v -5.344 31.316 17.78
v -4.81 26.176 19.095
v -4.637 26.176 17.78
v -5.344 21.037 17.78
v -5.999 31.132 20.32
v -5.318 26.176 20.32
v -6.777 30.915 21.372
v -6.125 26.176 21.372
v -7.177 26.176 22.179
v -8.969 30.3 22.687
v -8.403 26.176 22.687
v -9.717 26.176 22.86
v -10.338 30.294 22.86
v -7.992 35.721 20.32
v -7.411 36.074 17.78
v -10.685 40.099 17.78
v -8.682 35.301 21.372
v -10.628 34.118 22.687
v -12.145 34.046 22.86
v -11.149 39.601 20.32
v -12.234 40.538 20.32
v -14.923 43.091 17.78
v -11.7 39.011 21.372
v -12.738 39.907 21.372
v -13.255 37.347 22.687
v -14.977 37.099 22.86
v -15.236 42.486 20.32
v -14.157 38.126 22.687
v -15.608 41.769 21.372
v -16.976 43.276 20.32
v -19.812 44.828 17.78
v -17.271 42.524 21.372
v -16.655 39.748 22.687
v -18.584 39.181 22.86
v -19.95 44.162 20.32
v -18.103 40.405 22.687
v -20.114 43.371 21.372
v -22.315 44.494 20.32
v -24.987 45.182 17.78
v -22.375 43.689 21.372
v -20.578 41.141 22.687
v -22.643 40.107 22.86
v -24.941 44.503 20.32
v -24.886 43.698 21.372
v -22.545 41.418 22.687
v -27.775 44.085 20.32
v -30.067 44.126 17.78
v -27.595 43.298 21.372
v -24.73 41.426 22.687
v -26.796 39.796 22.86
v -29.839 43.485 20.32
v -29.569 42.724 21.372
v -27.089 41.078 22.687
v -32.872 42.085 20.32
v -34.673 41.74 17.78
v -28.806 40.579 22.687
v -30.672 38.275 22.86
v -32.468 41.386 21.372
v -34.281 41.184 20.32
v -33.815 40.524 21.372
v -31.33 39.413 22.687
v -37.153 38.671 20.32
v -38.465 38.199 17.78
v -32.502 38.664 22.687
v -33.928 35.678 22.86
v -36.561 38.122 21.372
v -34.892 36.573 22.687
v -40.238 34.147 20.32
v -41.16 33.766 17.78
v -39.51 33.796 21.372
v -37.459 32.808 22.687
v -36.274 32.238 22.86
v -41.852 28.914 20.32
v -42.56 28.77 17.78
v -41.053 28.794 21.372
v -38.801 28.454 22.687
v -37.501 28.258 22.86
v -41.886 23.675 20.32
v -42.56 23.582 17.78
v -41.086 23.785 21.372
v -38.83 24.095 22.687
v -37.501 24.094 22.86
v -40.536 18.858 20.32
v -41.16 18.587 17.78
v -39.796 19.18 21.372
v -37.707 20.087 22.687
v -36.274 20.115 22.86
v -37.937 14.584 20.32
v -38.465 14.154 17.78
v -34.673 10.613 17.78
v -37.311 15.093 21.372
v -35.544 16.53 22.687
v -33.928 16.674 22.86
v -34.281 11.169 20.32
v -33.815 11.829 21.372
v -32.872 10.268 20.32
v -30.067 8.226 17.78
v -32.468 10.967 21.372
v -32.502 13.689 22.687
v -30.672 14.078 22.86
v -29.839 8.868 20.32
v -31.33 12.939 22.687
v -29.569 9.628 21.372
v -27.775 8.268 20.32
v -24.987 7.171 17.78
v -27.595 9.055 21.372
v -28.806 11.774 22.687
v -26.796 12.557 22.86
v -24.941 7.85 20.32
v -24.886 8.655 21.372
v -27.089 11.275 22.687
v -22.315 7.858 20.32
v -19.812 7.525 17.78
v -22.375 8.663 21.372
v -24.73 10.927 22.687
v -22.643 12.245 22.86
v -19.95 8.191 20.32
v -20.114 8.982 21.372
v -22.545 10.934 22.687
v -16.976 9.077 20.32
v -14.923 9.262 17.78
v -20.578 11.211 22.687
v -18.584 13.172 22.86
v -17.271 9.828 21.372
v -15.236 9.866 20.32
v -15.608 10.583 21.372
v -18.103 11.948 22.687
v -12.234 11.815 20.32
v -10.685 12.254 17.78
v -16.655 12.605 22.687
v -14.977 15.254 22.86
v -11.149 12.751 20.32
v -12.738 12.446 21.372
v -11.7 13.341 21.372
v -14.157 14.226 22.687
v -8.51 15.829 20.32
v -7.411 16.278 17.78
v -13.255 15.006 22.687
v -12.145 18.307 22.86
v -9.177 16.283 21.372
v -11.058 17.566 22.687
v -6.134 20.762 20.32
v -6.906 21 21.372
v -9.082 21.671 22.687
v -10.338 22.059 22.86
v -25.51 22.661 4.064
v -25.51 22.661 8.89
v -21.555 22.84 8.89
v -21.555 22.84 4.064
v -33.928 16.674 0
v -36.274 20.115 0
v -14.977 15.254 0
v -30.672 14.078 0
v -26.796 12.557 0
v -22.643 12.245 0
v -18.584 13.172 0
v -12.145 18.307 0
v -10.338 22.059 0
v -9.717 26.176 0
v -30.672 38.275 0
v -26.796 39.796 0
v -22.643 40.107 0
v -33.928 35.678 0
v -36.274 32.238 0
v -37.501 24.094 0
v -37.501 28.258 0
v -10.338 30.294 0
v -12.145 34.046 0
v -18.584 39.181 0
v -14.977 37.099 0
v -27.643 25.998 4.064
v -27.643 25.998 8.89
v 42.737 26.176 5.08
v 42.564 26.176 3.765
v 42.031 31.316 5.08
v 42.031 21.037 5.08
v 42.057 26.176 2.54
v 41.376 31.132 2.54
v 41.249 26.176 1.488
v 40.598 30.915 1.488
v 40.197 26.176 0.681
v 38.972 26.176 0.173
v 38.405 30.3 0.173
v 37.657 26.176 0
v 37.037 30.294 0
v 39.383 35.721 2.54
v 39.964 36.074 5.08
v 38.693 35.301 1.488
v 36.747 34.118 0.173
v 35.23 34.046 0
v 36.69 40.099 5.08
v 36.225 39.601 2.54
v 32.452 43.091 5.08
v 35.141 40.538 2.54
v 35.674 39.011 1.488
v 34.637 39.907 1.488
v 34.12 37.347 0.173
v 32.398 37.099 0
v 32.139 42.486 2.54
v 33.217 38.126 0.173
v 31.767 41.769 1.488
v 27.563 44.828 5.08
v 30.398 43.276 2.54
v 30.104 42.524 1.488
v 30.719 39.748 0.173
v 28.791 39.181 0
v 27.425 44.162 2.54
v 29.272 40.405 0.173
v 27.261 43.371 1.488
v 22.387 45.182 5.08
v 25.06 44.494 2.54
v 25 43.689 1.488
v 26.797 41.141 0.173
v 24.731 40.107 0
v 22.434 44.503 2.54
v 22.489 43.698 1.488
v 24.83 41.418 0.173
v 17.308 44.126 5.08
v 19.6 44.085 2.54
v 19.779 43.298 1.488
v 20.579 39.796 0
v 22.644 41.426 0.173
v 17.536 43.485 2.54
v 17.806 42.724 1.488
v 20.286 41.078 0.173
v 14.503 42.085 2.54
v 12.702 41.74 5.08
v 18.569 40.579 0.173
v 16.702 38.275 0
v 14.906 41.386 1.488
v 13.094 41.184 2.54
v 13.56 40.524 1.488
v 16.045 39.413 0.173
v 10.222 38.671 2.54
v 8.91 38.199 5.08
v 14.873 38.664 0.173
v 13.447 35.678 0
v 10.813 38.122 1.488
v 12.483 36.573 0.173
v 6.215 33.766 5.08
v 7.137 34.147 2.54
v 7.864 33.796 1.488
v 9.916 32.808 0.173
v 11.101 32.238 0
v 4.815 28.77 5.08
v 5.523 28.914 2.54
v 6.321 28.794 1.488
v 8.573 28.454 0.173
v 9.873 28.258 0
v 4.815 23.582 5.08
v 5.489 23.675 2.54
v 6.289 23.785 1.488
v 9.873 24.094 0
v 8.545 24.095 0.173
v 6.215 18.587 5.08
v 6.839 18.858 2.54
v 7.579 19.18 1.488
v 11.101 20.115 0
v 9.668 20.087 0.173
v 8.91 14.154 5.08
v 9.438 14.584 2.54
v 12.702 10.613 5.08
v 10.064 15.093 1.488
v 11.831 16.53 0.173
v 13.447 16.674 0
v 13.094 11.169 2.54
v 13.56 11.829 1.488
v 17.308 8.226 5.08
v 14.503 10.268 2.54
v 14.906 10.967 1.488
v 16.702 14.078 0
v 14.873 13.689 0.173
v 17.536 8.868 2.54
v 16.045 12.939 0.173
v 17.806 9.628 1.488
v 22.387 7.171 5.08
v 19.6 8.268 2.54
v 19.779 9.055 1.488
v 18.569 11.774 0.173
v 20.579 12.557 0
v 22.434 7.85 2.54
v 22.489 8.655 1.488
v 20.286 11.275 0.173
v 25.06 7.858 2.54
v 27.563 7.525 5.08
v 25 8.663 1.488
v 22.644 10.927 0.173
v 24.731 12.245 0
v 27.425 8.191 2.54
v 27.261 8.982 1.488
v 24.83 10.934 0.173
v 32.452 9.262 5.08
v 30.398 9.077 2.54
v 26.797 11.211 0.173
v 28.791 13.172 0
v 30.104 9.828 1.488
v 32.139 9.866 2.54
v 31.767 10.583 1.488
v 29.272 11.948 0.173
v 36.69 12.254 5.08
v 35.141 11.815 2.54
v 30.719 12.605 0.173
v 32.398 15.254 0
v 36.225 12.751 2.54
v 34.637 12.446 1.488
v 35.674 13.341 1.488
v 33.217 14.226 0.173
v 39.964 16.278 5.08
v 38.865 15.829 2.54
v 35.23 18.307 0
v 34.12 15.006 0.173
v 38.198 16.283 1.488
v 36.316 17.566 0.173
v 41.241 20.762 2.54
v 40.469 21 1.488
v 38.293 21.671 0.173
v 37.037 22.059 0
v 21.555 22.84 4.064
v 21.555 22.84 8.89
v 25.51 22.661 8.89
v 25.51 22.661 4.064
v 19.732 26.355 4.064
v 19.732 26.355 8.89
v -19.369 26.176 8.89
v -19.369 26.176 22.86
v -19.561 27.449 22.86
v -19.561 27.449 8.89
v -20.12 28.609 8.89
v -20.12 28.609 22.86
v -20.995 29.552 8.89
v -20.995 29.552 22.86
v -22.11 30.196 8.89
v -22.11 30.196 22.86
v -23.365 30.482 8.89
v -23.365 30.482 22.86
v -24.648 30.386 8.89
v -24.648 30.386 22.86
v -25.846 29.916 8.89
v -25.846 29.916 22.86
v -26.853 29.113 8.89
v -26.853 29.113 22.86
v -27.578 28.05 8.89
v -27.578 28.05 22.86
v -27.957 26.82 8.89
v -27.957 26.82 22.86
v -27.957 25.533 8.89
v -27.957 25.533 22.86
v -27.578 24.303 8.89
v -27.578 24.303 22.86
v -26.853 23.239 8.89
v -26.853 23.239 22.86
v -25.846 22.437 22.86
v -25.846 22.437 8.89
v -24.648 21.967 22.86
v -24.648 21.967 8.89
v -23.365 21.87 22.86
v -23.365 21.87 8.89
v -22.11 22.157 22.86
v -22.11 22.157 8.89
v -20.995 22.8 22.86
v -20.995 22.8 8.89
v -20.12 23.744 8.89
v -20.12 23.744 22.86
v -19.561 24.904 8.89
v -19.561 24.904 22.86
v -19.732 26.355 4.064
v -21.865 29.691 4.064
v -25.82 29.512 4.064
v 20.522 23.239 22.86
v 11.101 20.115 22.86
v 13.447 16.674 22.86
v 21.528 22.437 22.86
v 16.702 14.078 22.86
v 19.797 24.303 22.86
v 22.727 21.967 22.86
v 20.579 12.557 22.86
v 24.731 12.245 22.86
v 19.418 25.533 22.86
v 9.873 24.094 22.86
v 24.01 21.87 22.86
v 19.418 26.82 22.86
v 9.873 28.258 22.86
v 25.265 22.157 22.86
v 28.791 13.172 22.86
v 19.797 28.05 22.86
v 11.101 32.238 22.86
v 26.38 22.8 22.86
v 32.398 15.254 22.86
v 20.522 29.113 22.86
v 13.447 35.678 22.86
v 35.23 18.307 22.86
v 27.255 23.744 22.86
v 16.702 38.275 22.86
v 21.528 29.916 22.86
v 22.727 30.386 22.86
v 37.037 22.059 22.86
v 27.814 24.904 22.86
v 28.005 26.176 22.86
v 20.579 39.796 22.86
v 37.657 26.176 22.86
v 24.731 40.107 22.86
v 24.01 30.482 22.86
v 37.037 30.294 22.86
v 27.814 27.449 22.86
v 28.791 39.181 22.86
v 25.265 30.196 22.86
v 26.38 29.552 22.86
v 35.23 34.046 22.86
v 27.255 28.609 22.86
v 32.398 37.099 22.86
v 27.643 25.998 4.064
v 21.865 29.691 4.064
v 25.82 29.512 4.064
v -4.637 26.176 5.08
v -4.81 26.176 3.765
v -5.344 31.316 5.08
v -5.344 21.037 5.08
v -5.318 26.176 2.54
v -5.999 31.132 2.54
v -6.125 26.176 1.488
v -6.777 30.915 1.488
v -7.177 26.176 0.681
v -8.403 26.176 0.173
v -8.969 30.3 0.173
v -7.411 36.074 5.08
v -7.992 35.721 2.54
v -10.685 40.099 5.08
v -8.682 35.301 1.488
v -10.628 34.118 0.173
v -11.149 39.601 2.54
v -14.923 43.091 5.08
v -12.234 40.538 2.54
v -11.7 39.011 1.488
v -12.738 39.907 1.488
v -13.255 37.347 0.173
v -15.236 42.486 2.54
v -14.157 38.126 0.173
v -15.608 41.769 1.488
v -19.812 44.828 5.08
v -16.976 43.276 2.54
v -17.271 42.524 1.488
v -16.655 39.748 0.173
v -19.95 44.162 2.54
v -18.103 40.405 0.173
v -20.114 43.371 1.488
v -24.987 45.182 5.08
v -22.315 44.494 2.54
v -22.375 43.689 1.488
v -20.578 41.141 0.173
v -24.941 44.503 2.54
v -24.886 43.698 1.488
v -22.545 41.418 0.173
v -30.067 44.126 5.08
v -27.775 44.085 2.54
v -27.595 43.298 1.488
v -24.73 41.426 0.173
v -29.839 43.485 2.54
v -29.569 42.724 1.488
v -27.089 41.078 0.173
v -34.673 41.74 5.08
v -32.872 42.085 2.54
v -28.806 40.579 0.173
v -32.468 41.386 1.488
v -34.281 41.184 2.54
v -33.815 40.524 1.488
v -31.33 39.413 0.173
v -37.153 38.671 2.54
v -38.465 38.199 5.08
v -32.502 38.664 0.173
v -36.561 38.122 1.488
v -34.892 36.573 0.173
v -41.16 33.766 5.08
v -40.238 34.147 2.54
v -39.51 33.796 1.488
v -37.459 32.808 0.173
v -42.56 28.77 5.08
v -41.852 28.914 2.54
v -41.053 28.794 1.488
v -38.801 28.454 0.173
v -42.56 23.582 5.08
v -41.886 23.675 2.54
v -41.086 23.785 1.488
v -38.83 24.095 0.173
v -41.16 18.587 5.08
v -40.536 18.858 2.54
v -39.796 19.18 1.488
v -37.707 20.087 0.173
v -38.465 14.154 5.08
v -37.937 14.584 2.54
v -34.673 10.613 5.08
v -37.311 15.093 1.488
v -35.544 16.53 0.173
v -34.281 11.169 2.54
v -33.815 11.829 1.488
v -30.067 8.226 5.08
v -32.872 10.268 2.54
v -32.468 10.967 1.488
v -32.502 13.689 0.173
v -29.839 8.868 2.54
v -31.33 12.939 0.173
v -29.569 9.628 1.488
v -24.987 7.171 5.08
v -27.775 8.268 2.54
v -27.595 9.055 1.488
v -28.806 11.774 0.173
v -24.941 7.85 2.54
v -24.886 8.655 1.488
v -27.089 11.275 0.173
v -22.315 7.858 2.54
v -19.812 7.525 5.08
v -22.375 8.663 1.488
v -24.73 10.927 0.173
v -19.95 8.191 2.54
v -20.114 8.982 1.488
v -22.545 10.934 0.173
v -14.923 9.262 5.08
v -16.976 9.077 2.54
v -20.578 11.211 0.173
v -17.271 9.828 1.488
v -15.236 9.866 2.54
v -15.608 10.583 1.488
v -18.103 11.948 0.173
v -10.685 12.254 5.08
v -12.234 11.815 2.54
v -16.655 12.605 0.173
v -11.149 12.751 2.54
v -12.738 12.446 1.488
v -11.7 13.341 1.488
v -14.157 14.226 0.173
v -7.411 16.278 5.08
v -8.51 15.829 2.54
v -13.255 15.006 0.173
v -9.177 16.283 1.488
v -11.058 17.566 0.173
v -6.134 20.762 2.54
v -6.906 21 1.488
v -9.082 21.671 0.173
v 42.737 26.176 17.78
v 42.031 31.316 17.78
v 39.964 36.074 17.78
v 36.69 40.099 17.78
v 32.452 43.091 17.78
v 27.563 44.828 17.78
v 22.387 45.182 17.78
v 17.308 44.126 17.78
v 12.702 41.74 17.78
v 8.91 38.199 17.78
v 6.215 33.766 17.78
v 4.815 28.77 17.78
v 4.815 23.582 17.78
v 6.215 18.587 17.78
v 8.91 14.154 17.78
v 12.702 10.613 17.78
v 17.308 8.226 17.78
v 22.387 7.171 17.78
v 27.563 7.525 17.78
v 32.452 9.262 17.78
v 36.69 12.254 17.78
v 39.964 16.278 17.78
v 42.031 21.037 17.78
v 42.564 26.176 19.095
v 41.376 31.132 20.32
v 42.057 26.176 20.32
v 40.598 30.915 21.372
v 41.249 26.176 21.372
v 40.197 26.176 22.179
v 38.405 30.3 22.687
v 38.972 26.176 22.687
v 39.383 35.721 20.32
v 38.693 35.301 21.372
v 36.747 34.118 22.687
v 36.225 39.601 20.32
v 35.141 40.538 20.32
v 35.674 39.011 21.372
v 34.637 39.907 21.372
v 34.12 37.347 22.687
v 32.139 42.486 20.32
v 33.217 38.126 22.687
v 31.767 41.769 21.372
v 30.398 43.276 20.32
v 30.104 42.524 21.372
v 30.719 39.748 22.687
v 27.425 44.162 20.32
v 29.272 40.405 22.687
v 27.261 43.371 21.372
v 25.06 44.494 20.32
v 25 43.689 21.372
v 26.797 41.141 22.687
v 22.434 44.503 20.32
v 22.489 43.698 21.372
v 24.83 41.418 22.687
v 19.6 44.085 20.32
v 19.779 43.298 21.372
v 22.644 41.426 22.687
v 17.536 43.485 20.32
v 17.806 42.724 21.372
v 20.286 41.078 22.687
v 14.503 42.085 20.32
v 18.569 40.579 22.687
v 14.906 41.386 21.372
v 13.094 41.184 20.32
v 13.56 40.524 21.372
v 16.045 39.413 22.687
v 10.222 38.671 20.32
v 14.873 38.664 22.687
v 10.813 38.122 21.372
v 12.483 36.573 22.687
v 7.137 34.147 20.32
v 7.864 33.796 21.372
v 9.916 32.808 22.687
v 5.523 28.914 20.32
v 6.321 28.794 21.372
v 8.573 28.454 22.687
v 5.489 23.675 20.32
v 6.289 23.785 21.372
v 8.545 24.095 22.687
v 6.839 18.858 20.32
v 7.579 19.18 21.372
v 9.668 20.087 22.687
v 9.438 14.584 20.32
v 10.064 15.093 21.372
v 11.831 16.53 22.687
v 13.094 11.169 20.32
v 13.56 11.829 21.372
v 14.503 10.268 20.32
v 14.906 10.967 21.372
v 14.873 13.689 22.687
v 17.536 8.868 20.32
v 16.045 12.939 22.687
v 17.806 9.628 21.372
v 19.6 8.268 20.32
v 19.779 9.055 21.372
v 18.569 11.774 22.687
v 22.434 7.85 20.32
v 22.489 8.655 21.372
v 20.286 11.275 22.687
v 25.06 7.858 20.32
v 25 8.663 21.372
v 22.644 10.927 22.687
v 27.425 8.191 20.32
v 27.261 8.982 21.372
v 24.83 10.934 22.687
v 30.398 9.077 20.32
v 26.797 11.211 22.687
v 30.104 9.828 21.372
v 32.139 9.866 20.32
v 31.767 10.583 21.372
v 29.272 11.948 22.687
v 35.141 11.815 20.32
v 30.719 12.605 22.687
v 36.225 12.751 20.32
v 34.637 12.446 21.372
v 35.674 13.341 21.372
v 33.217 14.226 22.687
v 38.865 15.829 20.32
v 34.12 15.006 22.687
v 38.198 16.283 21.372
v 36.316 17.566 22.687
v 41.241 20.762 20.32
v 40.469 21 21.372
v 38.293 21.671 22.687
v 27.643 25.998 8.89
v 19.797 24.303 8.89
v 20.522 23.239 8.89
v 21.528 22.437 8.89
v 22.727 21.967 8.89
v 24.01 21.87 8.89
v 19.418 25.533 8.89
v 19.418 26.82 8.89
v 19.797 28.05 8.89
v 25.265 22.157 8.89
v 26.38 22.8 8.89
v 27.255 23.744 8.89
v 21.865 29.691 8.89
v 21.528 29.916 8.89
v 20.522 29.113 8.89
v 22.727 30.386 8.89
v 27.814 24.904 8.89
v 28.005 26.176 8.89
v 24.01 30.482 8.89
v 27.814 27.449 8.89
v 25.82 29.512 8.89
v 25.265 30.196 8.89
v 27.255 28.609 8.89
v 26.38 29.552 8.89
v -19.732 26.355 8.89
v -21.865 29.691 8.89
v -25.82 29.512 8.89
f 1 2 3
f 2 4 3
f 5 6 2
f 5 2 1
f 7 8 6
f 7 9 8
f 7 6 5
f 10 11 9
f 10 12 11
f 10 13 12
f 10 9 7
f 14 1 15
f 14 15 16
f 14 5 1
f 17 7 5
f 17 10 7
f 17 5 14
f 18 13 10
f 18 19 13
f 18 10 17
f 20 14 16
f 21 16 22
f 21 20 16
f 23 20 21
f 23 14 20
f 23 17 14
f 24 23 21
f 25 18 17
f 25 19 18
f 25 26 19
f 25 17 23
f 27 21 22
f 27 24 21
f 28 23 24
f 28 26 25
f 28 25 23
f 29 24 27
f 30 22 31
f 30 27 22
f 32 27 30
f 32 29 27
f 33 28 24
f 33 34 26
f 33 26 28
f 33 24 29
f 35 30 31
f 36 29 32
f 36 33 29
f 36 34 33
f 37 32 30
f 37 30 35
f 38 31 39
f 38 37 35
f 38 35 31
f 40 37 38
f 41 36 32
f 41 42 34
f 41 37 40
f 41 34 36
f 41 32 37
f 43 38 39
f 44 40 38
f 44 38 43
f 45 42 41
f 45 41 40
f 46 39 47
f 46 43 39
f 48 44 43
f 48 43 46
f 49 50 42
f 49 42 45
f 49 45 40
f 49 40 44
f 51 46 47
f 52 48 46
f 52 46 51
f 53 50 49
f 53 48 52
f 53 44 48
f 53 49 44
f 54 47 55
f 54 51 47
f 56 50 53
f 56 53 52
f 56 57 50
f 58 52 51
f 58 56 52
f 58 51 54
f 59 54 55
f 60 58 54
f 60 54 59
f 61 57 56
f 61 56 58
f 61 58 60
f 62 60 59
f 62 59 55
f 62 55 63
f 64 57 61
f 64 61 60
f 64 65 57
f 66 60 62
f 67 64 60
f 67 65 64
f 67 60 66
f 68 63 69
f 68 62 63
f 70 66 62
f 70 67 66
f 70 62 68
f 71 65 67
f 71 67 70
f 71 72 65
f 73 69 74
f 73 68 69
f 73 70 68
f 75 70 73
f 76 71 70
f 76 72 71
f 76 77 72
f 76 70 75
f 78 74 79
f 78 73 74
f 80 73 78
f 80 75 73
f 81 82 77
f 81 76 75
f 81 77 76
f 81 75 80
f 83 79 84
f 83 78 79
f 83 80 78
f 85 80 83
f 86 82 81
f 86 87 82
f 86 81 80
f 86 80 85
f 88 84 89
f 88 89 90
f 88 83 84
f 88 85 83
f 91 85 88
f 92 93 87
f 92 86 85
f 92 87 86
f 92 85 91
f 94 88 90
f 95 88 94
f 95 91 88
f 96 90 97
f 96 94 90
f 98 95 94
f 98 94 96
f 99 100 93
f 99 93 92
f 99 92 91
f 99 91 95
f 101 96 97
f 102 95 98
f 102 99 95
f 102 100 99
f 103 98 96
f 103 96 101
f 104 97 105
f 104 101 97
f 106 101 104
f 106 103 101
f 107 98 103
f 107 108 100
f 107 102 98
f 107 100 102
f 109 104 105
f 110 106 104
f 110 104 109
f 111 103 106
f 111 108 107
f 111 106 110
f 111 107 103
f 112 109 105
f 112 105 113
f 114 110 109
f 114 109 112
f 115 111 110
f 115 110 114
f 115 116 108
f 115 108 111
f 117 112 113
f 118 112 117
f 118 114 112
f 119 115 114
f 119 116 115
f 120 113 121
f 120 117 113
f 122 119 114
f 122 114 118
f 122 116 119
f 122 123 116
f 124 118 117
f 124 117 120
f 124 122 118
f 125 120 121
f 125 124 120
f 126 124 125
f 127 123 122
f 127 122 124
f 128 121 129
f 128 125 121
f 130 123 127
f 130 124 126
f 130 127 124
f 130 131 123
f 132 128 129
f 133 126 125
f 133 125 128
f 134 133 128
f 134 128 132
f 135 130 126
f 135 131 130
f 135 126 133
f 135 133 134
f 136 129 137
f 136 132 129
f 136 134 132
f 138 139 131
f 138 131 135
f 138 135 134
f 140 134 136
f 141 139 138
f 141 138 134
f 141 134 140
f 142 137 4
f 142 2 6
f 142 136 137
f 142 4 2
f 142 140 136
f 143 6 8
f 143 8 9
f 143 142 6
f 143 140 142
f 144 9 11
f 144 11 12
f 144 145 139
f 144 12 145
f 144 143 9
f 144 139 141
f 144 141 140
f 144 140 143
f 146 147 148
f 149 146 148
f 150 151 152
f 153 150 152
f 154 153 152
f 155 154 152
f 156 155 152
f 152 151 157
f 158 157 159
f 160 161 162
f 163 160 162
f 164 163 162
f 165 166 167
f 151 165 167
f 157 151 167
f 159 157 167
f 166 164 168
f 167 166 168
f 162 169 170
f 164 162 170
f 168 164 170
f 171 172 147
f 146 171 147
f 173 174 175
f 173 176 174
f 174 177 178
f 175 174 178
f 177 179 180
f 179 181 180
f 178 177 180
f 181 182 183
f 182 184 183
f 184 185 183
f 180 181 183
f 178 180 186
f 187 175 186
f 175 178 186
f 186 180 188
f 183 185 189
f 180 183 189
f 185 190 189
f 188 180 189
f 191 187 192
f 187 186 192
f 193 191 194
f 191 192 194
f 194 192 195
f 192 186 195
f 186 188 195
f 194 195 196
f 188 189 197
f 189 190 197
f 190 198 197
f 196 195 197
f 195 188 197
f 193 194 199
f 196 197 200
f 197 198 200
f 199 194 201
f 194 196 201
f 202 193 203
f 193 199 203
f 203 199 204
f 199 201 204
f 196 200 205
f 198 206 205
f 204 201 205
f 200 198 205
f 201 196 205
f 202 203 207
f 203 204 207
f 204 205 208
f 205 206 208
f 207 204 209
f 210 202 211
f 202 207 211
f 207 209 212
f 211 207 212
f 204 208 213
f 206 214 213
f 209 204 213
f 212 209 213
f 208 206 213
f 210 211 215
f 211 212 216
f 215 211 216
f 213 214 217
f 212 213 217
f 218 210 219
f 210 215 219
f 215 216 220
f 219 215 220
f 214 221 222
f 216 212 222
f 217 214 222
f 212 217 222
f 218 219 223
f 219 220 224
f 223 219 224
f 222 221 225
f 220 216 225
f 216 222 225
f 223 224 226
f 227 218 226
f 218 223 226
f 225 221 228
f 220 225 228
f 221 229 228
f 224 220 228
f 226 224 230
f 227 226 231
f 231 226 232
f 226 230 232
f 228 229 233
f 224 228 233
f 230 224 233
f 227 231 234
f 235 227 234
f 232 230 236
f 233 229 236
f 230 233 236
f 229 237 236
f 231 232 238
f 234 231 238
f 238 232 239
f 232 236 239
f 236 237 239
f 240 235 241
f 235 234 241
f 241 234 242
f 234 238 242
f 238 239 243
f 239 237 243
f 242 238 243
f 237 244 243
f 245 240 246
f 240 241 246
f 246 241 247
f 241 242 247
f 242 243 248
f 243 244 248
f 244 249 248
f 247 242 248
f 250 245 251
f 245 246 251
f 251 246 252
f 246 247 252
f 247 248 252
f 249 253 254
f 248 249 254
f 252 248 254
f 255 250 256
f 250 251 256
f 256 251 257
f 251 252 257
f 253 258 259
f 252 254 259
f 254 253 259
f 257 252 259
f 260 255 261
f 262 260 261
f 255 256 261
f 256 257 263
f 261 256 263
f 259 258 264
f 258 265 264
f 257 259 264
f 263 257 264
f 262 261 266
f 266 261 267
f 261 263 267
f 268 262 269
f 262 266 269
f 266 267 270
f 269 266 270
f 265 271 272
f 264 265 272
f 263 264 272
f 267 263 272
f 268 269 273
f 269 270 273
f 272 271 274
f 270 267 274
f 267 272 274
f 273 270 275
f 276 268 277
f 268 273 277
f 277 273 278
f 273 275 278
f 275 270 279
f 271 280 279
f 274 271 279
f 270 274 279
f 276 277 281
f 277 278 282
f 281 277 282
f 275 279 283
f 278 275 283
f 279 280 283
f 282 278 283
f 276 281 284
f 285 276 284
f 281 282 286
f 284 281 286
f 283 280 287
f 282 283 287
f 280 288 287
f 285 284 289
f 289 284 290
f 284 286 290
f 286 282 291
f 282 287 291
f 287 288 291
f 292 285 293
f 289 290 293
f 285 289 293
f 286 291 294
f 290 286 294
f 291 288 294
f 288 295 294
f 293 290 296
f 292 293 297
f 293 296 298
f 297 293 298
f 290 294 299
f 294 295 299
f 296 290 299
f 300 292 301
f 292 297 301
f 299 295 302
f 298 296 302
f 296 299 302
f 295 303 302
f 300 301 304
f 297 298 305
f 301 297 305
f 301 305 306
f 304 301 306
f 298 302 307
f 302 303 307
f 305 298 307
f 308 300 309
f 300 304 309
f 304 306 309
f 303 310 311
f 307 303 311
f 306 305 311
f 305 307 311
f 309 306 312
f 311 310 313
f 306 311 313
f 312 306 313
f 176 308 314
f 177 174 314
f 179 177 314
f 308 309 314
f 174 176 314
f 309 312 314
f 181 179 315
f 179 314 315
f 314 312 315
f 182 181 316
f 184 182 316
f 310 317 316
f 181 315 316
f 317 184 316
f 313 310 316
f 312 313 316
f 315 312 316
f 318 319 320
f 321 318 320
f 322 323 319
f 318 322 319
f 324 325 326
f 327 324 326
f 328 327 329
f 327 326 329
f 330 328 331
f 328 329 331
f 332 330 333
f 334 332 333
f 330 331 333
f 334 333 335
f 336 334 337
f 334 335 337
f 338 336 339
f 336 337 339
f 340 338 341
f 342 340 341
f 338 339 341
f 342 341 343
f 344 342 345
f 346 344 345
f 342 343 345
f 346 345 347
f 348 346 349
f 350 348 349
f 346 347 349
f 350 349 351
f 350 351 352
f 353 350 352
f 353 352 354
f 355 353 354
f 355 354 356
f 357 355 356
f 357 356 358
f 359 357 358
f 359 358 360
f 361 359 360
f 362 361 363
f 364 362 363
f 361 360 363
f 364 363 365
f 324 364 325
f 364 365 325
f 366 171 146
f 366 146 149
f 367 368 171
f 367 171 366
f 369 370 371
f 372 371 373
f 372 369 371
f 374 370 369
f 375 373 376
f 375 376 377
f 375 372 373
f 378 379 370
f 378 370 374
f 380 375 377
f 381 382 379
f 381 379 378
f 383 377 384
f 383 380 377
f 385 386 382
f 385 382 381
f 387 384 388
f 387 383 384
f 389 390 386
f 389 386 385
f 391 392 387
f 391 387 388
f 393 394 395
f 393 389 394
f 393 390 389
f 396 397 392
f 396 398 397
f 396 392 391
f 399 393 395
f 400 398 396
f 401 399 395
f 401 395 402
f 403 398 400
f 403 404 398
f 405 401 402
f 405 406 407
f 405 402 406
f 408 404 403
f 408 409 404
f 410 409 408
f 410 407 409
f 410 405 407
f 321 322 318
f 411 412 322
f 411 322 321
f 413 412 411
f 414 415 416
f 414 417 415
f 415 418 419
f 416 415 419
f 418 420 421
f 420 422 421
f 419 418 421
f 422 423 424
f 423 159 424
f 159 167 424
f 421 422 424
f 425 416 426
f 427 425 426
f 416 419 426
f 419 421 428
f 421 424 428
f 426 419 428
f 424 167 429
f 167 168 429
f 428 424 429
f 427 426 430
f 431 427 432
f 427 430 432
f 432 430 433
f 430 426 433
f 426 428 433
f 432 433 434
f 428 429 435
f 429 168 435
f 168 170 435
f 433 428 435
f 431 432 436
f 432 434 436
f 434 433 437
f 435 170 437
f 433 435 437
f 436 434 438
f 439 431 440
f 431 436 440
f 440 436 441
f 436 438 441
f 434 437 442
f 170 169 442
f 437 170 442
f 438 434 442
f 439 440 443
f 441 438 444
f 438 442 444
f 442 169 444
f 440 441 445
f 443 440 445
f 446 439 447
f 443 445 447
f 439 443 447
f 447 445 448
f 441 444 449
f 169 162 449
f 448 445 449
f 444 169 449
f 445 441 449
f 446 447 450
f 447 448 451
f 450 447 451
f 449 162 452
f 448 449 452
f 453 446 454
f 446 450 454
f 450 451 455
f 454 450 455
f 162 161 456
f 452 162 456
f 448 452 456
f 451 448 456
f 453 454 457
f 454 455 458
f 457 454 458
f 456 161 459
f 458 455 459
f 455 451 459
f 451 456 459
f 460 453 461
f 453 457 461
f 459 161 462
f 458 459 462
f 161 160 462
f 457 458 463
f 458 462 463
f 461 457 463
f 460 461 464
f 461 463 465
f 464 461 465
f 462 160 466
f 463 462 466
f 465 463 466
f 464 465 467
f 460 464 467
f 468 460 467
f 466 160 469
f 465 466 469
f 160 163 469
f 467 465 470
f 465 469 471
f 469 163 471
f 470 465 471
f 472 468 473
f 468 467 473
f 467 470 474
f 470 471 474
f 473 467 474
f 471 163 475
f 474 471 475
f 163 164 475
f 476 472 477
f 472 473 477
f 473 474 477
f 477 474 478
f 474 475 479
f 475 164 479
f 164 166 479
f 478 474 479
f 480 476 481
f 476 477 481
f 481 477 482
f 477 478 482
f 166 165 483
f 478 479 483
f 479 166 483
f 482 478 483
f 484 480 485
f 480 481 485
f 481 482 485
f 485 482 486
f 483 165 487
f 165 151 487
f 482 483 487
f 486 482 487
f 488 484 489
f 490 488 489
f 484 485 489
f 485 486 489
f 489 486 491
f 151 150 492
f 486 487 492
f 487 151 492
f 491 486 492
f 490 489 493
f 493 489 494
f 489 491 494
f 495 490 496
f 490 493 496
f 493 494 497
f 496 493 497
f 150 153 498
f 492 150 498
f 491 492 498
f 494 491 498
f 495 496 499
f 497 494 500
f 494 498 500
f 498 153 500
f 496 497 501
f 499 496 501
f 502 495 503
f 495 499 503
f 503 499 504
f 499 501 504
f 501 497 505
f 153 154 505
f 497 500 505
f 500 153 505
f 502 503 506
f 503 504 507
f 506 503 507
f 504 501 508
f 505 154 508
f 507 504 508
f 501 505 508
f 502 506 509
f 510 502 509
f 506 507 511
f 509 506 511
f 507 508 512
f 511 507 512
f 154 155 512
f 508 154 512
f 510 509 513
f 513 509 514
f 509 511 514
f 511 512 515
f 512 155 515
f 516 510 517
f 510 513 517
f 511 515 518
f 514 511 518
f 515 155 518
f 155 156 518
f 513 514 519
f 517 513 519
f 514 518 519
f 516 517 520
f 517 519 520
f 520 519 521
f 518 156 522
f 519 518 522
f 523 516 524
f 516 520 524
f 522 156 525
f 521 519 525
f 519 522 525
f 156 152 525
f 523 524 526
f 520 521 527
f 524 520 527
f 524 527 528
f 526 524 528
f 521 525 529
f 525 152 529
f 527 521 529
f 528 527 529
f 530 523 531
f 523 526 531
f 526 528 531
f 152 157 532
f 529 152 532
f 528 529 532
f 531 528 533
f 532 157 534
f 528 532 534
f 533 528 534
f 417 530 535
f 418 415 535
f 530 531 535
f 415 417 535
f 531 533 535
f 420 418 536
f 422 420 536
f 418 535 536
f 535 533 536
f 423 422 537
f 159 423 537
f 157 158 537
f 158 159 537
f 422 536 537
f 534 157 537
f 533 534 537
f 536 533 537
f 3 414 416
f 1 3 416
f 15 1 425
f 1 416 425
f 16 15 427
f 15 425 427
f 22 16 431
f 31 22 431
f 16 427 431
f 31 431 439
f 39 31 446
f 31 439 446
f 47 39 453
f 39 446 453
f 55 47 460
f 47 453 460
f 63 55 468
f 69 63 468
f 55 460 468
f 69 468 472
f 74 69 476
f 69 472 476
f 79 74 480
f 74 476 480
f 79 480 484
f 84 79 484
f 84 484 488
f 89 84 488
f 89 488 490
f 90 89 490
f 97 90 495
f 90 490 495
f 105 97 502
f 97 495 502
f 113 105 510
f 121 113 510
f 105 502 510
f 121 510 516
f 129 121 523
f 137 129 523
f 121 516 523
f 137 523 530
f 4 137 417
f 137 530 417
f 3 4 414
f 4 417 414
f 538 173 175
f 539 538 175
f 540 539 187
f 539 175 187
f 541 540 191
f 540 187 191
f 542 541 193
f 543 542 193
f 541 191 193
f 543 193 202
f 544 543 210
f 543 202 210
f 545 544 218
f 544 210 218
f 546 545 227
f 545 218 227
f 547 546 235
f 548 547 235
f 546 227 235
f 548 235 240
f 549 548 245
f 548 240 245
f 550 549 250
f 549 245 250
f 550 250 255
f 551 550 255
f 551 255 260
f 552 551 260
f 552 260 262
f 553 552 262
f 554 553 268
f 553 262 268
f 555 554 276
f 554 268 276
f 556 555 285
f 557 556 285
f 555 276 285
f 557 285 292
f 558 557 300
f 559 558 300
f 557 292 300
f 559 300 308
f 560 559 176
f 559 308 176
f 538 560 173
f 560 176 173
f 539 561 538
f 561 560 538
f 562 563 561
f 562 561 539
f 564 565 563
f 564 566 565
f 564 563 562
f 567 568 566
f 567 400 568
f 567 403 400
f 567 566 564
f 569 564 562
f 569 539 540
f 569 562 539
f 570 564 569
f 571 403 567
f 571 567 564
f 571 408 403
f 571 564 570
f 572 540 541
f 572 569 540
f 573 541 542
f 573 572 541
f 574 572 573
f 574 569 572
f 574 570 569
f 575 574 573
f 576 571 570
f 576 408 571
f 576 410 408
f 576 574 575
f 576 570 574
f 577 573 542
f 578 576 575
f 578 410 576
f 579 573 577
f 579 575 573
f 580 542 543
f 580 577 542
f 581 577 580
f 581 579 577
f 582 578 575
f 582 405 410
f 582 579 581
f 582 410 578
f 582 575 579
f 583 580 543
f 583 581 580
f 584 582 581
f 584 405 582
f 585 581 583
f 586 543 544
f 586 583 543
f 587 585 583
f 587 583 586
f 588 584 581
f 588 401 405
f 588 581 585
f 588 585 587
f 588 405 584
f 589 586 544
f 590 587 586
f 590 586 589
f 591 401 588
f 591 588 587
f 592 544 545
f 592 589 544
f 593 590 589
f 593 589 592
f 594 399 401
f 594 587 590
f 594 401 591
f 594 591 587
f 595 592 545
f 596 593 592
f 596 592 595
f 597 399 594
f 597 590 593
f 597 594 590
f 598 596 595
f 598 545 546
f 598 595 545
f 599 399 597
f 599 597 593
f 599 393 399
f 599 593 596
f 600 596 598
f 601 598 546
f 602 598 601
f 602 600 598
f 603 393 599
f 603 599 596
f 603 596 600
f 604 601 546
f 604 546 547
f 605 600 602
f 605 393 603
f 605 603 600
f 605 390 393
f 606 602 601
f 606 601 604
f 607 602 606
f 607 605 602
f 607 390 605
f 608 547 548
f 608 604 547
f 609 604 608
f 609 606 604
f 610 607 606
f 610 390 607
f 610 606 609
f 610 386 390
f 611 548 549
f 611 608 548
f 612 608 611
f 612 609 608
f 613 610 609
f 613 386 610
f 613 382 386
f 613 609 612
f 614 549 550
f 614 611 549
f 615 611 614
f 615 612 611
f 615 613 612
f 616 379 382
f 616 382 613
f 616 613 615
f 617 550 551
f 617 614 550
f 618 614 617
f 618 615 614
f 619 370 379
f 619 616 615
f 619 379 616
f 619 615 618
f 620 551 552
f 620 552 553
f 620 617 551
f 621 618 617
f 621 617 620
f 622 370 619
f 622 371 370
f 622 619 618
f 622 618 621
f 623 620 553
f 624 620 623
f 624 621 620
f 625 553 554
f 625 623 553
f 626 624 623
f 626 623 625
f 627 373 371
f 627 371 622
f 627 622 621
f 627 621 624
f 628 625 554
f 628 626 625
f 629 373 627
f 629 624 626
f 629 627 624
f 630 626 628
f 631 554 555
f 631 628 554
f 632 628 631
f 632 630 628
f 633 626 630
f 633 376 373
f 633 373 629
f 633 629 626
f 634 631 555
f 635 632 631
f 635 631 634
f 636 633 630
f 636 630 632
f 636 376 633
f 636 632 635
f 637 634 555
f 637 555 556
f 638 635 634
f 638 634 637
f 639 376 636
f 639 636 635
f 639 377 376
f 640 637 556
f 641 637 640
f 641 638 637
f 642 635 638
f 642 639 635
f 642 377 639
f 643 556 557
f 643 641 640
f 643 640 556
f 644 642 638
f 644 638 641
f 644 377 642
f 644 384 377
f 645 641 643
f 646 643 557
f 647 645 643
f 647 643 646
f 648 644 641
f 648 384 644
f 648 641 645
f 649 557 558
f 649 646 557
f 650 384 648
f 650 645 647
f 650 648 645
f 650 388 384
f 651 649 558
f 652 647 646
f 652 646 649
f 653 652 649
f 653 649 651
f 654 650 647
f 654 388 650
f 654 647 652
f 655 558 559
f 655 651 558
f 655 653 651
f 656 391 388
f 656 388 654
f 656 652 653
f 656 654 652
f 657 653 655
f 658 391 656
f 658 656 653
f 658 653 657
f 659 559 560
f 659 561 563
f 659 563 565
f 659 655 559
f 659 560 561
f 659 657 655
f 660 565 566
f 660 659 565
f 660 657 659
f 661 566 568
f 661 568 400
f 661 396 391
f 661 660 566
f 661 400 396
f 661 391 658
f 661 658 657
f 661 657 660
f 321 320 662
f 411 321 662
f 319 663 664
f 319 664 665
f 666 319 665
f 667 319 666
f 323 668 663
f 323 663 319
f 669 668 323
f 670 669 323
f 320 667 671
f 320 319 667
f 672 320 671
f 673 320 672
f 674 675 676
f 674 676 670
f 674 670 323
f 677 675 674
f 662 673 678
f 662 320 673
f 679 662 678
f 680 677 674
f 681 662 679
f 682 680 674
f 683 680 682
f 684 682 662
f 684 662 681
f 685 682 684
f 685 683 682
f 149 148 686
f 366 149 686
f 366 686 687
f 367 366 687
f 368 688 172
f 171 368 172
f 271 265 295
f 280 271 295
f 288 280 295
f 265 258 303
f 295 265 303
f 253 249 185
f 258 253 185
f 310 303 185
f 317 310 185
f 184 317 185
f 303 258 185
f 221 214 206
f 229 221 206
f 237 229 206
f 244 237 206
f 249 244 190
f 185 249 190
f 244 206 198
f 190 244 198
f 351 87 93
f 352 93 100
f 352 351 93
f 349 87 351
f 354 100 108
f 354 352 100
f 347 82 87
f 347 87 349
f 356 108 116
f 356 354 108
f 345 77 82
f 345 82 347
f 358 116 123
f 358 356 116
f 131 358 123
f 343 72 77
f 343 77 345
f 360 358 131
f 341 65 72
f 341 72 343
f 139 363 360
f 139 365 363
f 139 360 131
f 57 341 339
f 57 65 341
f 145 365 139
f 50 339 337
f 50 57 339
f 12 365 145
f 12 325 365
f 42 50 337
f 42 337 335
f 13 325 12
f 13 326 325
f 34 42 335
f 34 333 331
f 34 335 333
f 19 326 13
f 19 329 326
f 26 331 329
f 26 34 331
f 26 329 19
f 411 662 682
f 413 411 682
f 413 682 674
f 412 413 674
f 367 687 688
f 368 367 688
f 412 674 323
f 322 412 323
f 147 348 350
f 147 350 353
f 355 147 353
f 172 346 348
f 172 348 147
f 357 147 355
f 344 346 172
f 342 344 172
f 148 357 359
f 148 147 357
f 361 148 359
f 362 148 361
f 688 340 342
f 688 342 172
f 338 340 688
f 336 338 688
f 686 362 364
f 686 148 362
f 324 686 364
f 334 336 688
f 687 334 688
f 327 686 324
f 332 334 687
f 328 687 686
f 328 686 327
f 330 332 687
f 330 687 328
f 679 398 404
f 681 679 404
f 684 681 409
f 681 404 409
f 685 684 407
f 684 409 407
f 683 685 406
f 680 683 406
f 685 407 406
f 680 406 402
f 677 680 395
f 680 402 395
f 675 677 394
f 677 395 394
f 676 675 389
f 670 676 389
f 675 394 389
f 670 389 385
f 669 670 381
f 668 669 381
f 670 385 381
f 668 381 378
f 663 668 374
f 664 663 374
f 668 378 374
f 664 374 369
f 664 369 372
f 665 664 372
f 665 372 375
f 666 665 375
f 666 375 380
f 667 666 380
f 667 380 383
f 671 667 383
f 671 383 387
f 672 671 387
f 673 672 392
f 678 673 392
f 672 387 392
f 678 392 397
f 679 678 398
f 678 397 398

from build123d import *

# Parameters (mm, degrees)
F0_R     = 19.05
F1_DEPTH = 22.86
F2_R     = 4.318
F3_DEPTH = 13.97
F5_DEPTH = 4.826
F6_R     = 5.08


with BuildPart() as f1:
    # F0 (on Top) → F1 (new body)
    with BuildSketch(Plane.XY):
        with Locations((-23.687395, 26.176361)):
            Circle(F0_R)
        with Locations((23.687395, 26.176361)):
            Circle(F0_R)
    extrude(amount=F1_DEPTH)

    # F2 (on face) → F3 (cut)
    with BuildSketch(Plane.XY.offset(22.86)):
        with Locations((-23.687395, 26.176361)):
            Circle(F2_R)
        with Locations((23.687395, 26.176361)):
            Circle(F2_R)
    extrude(amount=-F3_DEPTH, mode=Mode.SUBTRACT)

    # F4 (on face) → F5 (cut)
    with BuildSketch(Plane.XY.offset(8.89)):
        Polygon((-21.55482, 22.840268), (-19.731967, 26.355179), (-21.864542, 29.691271), (-25.81997, 29.512453), (-27.642823, 25.997542), (-25.510248, 22.66145), align=None)
        Polygon((25.81997, 29.512453), (21.864542, 29.691271), (19.731967, 26.355179), (21.55482, 22.840268), (25.510248, 22.66145), (27.642823, 25.997542), align=None)
    extrude(amount=-F5_DEPTH, mode=Mode.SUBTRACT)

    # F6
    f6_edges = [f1.edges().sort_by_distance(p)[0] for p in [
        (-42.737395, 26.176361, 0),
        (-4.637395, 26.176361, 11.43),
        (-42.737395, 26.176361, 22.86),
        (4.637395, 26.176361, 0),
        (42.737395, 26.176361, 11.43),
        (4.637395, 26.176361, 22.86),
    ]]
    fillet(f6_edges, radius=F6_R)


solid = f1.part
